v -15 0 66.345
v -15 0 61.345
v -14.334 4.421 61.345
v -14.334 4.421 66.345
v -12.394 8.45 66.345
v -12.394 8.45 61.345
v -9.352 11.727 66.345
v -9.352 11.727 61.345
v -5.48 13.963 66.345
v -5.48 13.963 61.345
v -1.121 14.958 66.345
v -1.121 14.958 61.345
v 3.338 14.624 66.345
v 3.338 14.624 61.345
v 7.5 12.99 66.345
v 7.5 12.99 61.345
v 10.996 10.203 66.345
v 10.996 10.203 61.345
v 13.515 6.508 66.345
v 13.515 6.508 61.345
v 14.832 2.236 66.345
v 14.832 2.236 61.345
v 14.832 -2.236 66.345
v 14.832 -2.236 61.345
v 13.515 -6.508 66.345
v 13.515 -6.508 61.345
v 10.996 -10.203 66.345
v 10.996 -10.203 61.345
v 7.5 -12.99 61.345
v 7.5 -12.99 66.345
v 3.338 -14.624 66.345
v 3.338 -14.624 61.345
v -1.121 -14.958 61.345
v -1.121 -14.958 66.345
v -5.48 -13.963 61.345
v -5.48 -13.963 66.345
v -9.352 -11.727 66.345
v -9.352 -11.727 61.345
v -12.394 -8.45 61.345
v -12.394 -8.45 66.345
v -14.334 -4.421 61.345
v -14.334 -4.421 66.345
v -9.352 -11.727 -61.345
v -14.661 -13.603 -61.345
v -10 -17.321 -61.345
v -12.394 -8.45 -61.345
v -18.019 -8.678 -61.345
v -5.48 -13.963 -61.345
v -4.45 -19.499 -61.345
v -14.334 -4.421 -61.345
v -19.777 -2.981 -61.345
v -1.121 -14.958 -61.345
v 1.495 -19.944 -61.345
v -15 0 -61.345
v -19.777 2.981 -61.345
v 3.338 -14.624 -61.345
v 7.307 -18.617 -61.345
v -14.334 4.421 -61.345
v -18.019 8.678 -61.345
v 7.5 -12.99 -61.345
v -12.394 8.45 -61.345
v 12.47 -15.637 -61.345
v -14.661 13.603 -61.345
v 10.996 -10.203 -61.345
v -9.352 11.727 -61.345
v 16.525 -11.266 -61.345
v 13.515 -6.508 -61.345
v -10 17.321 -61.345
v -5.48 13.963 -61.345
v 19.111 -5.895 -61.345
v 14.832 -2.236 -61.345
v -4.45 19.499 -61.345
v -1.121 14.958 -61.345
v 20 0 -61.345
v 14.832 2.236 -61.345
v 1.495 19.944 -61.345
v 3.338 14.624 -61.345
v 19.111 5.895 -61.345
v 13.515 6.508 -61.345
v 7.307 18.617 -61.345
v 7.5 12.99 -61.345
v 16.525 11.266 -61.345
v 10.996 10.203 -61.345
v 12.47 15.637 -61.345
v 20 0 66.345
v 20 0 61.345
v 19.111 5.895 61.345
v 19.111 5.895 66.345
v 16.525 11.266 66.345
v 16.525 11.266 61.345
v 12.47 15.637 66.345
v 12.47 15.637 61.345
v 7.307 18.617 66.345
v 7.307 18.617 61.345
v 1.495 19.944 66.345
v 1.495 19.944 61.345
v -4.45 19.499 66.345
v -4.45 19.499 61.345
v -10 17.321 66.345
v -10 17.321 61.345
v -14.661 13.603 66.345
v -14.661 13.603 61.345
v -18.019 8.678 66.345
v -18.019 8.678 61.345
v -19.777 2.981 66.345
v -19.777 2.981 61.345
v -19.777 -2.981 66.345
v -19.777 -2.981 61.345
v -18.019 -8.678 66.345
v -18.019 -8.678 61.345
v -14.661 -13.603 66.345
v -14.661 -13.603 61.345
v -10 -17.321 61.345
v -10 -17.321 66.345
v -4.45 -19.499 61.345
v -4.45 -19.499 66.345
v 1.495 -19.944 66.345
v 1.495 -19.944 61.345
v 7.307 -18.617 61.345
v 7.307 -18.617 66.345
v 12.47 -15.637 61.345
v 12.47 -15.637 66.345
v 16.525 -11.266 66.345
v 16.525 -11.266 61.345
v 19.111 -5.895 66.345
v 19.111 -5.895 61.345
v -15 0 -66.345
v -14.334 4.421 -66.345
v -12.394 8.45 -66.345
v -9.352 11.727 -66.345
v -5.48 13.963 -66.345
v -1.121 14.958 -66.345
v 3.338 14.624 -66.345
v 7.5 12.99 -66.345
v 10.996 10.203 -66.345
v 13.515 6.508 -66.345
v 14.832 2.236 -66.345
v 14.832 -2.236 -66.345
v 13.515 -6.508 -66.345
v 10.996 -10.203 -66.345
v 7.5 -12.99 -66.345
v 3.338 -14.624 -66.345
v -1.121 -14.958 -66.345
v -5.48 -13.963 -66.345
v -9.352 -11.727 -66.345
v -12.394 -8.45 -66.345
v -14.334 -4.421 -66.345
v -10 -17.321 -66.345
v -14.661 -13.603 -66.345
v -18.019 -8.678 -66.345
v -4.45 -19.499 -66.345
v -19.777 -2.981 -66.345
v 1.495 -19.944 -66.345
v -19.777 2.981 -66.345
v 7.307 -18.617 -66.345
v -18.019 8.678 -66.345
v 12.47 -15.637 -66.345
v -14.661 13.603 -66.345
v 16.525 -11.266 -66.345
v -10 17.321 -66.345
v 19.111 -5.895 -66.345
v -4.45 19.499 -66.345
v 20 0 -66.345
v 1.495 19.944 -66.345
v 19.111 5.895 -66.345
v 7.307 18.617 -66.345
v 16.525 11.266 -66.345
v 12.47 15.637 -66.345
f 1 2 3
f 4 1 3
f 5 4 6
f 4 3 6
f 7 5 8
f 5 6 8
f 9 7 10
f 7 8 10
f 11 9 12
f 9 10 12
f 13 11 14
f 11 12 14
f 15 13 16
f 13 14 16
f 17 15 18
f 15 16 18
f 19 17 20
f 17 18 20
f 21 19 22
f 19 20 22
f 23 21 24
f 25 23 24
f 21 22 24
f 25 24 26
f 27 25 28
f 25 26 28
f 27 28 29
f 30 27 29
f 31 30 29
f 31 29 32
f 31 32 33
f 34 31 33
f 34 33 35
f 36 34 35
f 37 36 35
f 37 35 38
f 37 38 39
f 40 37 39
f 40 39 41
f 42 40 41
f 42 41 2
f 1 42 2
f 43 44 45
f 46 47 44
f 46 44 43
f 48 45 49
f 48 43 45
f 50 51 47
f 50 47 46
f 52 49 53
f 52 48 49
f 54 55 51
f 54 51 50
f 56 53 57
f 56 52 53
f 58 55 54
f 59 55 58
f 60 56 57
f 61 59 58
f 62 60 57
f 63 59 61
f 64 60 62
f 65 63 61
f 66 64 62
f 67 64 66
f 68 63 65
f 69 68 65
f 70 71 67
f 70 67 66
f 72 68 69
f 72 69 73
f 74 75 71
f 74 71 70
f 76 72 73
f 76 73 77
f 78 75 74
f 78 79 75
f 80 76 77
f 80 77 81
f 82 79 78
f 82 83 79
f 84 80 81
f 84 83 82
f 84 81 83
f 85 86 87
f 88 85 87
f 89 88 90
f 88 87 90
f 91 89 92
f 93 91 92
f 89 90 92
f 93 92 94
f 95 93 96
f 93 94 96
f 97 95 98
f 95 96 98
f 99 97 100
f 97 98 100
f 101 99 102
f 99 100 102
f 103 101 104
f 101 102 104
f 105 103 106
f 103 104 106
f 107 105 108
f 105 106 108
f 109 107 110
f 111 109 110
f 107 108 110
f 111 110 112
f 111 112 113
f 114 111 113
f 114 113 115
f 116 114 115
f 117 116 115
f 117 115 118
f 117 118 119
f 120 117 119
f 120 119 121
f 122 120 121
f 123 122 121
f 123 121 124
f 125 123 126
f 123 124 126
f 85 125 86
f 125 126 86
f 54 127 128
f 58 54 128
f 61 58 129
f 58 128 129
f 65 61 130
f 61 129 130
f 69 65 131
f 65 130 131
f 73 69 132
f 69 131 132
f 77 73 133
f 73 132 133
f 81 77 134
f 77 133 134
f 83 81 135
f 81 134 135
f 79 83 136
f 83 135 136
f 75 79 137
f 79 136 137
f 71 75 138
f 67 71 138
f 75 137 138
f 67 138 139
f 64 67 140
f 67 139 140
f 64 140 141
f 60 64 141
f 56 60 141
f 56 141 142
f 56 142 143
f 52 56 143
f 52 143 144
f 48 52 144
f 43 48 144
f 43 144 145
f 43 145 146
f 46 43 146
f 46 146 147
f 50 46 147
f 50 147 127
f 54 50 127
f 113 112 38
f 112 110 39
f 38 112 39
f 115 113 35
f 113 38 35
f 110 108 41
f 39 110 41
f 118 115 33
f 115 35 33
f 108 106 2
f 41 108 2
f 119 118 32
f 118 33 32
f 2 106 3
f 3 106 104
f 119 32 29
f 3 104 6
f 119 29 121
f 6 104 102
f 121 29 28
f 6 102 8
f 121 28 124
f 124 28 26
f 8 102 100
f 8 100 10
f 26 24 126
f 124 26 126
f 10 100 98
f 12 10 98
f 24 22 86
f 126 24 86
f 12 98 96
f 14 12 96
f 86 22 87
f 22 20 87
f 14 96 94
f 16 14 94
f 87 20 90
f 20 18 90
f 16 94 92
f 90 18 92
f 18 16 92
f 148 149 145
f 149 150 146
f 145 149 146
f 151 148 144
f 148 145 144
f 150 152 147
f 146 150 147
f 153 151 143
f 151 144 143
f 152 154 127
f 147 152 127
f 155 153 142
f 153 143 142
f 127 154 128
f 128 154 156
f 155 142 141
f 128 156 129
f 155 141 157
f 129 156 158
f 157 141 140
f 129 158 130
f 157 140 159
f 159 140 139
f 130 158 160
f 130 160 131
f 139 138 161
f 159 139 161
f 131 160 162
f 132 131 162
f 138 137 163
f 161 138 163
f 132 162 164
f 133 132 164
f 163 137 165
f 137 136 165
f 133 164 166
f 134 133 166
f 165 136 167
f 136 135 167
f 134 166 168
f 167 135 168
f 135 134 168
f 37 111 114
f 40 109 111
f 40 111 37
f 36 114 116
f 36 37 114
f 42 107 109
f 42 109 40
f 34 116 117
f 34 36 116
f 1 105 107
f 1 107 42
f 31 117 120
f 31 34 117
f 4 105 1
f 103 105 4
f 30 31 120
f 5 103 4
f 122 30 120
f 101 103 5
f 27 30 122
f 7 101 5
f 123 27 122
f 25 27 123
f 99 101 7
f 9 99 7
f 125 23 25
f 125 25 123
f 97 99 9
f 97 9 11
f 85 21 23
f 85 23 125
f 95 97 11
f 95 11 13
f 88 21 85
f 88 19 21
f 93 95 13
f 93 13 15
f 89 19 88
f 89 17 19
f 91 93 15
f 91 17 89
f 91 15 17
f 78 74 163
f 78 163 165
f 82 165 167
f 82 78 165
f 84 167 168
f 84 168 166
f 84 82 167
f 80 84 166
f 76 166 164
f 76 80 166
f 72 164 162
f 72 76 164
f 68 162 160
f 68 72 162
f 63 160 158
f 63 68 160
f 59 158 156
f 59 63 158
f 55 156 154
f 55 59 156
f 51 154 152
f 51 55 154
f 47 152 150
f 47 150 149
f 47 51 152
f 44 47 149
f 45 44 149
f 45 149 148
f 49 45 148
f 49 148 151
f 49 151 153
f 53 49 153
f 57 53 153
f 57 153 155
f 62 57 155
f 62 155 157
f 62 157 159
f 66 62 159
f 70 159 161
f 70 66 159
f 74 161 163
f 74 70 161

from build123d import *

# Parameters (mm, degrees)
SKETCH1_R               = 12.7
BOSS_EXTRUDE1_DEPTH     = 61.345
SKETCH2_R               = 20
SKETCH2_R_2             = 18
CUT_EXTRUDE2_DEPTH      = 1.85
SKETCH6_R               = 20
BOSS_EXTRUDE2_DEPTH     = 5
SKETCH7_R               = 15
CUT_EXTRUDE3_DEPTH      = 1
CUT_EXTRUDE3_DEPTH_BACK = 133.69


with BuildPart() as part:
    # Sketch1 → Boss-Extrude1 (new body)
    with BuildSketch(Plane.XY):
        Circle(SKETCH1_R)
    extrude(amount=BOSS_EXTRUDE1_DEPTH)

    # Sketch2 → Cut-Extrude2 (cut)
    with BuildSketch(Plane.XY.offset(61.345)):
        Circle(SKETCH2_R)
        Circle(SKETCH2_R_2, mode=Mode.SUBTRACT)
    extrude(amount=-CUT_EXTRUDE2_DEPTH, mode=Mode.SUBTRACT)

    # Sketch6 → Boss-Extrude2 (add)
    with BuildSketch(Plane.XY.offset(61.345)):
        Circle(SKETCH6_R)
    extrude(amount=BOSS_EXTRUDE2_DEPTH)

    # Mirror2: part across plane


with BuildPart() as part_1:
    add(part.part)
    add(part.part.mirror(Plane.XY))

    # Sketch7 → Cut-Extrude3 (cut, two sides)
    with BuildSketch(Plane(origin=(0, 0, -66.345), x_dir=(-1, 0, 0), z_dir=(0, 0, -1))) as cut_extrude3_sk:
        Circle(SKETCH7_R)
    extrude(amount=CUT_EXTRUDE3_DEPTH, mode=Mode.SUBTRACT)
    extrude(cut_extrude3_sk.sketch, amount=-CUT_EXTRUDE3_DEPTH_BACK, mode=Mode.SUBTRACT)


solid = part_1.part
